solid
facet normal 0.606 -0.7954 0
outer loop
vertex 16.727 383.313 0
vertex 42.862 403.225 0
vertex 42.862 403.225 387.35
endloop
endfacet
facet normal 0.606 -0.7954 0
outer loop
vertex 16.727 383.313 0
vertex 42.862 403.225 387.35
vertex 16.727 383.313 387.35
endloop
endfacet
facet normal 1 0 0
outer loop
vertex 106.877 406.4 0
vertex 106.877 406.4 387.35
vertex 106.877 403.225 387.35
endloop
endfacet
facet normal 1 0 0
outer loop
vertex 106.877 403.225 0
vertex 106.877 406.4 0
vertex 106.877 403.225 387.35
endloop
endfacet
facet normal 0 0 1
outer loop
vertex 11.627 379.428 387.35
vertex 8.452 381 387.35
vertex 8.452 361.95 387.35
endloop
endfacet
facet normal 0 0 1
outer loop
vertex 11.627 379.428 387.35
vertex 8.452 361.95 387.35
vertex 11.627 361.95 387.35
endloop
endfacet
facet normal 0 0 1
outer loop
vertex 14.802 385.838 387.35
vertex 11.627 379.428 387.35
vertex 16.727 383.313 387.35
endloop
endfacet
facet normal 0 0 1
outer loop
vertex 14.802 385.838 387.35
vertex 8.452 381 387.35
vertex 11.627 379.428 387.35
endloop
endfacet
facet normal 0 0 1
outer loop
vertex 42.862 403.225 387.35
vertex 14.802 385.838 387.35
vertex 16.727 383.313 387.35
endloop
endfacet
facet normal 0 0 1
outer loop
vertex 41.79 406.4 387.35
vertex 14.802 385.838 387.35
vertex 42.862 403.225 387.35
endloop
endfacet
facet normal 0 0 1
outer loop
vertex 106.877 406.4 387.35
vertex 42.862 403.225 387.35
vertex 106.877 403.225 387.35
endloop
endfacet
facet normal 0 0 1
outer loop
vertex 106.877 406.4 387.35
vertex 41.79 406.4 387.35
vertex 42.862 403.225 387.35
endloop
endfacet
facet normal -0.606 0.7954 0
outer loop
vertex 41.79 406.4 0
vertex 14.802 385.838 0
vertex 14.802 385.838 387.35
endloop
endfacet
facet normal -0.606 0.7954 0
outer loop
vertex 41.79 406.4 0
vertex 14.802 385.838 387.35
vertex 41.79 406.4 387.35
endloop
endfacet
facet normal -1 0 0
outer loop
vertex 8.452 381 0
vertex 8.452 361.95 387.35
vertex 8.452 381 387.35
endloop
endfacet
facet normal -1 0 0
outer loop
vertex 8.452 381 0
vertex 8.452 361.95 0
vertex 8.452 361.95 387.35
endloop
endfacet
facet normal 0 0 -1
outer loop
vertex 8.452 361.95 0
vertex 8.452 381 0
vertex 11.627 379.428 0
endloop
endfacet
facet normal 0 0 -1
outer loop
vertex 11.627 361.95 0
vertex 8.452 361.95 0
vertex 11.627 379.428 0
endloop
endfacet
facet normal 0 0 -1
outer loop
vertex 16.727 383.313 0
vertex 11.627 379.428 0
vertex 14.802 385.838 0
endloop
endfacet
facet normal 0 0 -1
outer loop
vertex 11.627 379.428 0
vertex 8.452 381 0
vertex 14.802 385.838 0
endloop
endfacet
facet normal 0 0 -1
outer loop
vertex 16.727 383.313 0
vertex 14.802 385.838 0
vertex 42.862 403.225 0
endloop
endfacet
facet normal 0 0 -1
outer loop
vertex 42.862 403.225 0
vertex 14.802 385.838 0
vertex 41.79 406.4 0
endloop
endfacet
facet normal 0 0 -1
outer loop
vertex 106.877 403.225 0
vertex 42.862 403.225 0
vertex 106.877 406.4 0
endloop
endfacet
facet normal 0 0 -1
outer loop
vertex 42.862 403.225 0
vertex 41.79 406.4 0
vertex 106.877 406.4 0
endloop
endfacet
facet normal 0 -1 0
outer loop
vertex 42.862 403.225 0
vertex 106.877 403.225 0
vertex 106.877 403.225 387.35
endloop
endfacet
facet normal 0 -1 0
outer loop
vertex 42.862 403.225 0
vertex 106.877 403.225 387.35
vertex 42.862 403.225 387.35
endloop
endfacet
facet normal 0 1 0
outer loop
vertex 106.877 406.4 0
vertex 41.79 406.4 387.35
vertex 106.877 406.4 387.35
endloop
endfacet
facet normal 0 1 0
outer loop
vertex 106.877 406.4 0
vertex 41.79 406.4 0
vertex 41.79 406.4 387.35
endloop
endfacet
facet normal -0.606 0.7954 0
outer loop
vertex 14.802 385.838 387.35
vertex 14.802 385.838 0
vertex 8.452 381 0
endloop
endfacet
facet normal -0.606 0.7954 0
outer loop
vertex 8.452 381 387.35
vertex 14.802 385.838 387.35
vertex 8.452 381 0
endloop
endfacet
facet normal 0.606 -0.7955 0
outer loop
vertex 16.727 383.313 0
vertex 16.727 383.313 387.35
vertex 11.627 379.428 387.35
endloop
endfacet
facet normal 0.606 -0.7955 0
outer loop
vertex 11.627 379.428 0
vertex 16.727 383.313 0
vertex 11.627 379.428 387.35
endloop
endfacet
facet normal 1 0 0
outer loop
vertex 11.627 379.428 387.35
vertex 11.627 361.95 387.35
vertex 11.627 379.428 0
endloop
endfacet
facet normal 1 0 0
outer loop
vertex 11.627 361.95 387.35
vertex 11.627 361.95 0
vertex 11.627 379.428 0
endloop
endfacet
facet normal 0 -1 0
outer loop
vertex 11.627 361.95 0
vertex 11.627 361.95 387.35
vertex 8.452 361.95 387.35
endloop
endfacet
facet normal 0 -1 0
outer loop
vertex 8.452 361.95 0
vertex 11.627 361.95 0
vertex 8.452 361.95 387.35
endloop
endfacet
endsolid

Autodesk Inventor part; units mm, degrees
ref_plane "YZ Plane" through (0, 0, 0) normal (1, 0, 0) x (0, 1, 0)
ref_plane "XZ Plane" through (0, 0, 0) normal (0, 1, 0) x (-1, 0, 0)
ref_plane "XY Plane" through (0, 0, 0) normal (0, 0, 1) x (1, 0, 0)
ref_plane "Work Plane1" through (0, 0, 0) normal (0, 0, 1) x (1, 0, 0)
sketch "Sketch1" plane through (0, 0, 0) normal (0, 0, 1) x (1, 0, 0)
  line L0 (41.7899, 406.4) -> (106.8774, 406.4) projected
  line L1 (14.8024, 385.8381) -> (41.7899, 406.4) projected
  line L2 (106.8774, 403.225) -> (42.8616, 403.225)
  line L3 (42.8616, 403.225) -> (16.7266, 383.3126)
  line L4 (106.8774, 406.4) -> (106.8774, 403.225)
  line L5 (11.6274, 361.95) -> (11.6274, 80.1687) projected
  line L6 (16.7266, 383.3126) -> (11.6274, 379.4275)
  line L7 (14.8024, 385.8381) -> (8.4524, 381)
  line L8 (11.6274, 361.95) -> (11.6274, 379.4275)
  line L9 (11.6274, 361.95) -> (11.6274, 80.1687) projected
  line L10 (8.4524, 361.95) -> (8.4524, 80.1687) projected
  line L11 (11.6274, 361.95) -> (8.4524, 361.95) projected
  line L12 (8.4524, 361.95) -> (8.4524, 381)
  point P0 (0, 0)
  dimension "d0" = 3.175
extrude "Extrusion1" add sketch "Sketch1" along normal blind 387.35
properties part number "Drive BaseFront"
